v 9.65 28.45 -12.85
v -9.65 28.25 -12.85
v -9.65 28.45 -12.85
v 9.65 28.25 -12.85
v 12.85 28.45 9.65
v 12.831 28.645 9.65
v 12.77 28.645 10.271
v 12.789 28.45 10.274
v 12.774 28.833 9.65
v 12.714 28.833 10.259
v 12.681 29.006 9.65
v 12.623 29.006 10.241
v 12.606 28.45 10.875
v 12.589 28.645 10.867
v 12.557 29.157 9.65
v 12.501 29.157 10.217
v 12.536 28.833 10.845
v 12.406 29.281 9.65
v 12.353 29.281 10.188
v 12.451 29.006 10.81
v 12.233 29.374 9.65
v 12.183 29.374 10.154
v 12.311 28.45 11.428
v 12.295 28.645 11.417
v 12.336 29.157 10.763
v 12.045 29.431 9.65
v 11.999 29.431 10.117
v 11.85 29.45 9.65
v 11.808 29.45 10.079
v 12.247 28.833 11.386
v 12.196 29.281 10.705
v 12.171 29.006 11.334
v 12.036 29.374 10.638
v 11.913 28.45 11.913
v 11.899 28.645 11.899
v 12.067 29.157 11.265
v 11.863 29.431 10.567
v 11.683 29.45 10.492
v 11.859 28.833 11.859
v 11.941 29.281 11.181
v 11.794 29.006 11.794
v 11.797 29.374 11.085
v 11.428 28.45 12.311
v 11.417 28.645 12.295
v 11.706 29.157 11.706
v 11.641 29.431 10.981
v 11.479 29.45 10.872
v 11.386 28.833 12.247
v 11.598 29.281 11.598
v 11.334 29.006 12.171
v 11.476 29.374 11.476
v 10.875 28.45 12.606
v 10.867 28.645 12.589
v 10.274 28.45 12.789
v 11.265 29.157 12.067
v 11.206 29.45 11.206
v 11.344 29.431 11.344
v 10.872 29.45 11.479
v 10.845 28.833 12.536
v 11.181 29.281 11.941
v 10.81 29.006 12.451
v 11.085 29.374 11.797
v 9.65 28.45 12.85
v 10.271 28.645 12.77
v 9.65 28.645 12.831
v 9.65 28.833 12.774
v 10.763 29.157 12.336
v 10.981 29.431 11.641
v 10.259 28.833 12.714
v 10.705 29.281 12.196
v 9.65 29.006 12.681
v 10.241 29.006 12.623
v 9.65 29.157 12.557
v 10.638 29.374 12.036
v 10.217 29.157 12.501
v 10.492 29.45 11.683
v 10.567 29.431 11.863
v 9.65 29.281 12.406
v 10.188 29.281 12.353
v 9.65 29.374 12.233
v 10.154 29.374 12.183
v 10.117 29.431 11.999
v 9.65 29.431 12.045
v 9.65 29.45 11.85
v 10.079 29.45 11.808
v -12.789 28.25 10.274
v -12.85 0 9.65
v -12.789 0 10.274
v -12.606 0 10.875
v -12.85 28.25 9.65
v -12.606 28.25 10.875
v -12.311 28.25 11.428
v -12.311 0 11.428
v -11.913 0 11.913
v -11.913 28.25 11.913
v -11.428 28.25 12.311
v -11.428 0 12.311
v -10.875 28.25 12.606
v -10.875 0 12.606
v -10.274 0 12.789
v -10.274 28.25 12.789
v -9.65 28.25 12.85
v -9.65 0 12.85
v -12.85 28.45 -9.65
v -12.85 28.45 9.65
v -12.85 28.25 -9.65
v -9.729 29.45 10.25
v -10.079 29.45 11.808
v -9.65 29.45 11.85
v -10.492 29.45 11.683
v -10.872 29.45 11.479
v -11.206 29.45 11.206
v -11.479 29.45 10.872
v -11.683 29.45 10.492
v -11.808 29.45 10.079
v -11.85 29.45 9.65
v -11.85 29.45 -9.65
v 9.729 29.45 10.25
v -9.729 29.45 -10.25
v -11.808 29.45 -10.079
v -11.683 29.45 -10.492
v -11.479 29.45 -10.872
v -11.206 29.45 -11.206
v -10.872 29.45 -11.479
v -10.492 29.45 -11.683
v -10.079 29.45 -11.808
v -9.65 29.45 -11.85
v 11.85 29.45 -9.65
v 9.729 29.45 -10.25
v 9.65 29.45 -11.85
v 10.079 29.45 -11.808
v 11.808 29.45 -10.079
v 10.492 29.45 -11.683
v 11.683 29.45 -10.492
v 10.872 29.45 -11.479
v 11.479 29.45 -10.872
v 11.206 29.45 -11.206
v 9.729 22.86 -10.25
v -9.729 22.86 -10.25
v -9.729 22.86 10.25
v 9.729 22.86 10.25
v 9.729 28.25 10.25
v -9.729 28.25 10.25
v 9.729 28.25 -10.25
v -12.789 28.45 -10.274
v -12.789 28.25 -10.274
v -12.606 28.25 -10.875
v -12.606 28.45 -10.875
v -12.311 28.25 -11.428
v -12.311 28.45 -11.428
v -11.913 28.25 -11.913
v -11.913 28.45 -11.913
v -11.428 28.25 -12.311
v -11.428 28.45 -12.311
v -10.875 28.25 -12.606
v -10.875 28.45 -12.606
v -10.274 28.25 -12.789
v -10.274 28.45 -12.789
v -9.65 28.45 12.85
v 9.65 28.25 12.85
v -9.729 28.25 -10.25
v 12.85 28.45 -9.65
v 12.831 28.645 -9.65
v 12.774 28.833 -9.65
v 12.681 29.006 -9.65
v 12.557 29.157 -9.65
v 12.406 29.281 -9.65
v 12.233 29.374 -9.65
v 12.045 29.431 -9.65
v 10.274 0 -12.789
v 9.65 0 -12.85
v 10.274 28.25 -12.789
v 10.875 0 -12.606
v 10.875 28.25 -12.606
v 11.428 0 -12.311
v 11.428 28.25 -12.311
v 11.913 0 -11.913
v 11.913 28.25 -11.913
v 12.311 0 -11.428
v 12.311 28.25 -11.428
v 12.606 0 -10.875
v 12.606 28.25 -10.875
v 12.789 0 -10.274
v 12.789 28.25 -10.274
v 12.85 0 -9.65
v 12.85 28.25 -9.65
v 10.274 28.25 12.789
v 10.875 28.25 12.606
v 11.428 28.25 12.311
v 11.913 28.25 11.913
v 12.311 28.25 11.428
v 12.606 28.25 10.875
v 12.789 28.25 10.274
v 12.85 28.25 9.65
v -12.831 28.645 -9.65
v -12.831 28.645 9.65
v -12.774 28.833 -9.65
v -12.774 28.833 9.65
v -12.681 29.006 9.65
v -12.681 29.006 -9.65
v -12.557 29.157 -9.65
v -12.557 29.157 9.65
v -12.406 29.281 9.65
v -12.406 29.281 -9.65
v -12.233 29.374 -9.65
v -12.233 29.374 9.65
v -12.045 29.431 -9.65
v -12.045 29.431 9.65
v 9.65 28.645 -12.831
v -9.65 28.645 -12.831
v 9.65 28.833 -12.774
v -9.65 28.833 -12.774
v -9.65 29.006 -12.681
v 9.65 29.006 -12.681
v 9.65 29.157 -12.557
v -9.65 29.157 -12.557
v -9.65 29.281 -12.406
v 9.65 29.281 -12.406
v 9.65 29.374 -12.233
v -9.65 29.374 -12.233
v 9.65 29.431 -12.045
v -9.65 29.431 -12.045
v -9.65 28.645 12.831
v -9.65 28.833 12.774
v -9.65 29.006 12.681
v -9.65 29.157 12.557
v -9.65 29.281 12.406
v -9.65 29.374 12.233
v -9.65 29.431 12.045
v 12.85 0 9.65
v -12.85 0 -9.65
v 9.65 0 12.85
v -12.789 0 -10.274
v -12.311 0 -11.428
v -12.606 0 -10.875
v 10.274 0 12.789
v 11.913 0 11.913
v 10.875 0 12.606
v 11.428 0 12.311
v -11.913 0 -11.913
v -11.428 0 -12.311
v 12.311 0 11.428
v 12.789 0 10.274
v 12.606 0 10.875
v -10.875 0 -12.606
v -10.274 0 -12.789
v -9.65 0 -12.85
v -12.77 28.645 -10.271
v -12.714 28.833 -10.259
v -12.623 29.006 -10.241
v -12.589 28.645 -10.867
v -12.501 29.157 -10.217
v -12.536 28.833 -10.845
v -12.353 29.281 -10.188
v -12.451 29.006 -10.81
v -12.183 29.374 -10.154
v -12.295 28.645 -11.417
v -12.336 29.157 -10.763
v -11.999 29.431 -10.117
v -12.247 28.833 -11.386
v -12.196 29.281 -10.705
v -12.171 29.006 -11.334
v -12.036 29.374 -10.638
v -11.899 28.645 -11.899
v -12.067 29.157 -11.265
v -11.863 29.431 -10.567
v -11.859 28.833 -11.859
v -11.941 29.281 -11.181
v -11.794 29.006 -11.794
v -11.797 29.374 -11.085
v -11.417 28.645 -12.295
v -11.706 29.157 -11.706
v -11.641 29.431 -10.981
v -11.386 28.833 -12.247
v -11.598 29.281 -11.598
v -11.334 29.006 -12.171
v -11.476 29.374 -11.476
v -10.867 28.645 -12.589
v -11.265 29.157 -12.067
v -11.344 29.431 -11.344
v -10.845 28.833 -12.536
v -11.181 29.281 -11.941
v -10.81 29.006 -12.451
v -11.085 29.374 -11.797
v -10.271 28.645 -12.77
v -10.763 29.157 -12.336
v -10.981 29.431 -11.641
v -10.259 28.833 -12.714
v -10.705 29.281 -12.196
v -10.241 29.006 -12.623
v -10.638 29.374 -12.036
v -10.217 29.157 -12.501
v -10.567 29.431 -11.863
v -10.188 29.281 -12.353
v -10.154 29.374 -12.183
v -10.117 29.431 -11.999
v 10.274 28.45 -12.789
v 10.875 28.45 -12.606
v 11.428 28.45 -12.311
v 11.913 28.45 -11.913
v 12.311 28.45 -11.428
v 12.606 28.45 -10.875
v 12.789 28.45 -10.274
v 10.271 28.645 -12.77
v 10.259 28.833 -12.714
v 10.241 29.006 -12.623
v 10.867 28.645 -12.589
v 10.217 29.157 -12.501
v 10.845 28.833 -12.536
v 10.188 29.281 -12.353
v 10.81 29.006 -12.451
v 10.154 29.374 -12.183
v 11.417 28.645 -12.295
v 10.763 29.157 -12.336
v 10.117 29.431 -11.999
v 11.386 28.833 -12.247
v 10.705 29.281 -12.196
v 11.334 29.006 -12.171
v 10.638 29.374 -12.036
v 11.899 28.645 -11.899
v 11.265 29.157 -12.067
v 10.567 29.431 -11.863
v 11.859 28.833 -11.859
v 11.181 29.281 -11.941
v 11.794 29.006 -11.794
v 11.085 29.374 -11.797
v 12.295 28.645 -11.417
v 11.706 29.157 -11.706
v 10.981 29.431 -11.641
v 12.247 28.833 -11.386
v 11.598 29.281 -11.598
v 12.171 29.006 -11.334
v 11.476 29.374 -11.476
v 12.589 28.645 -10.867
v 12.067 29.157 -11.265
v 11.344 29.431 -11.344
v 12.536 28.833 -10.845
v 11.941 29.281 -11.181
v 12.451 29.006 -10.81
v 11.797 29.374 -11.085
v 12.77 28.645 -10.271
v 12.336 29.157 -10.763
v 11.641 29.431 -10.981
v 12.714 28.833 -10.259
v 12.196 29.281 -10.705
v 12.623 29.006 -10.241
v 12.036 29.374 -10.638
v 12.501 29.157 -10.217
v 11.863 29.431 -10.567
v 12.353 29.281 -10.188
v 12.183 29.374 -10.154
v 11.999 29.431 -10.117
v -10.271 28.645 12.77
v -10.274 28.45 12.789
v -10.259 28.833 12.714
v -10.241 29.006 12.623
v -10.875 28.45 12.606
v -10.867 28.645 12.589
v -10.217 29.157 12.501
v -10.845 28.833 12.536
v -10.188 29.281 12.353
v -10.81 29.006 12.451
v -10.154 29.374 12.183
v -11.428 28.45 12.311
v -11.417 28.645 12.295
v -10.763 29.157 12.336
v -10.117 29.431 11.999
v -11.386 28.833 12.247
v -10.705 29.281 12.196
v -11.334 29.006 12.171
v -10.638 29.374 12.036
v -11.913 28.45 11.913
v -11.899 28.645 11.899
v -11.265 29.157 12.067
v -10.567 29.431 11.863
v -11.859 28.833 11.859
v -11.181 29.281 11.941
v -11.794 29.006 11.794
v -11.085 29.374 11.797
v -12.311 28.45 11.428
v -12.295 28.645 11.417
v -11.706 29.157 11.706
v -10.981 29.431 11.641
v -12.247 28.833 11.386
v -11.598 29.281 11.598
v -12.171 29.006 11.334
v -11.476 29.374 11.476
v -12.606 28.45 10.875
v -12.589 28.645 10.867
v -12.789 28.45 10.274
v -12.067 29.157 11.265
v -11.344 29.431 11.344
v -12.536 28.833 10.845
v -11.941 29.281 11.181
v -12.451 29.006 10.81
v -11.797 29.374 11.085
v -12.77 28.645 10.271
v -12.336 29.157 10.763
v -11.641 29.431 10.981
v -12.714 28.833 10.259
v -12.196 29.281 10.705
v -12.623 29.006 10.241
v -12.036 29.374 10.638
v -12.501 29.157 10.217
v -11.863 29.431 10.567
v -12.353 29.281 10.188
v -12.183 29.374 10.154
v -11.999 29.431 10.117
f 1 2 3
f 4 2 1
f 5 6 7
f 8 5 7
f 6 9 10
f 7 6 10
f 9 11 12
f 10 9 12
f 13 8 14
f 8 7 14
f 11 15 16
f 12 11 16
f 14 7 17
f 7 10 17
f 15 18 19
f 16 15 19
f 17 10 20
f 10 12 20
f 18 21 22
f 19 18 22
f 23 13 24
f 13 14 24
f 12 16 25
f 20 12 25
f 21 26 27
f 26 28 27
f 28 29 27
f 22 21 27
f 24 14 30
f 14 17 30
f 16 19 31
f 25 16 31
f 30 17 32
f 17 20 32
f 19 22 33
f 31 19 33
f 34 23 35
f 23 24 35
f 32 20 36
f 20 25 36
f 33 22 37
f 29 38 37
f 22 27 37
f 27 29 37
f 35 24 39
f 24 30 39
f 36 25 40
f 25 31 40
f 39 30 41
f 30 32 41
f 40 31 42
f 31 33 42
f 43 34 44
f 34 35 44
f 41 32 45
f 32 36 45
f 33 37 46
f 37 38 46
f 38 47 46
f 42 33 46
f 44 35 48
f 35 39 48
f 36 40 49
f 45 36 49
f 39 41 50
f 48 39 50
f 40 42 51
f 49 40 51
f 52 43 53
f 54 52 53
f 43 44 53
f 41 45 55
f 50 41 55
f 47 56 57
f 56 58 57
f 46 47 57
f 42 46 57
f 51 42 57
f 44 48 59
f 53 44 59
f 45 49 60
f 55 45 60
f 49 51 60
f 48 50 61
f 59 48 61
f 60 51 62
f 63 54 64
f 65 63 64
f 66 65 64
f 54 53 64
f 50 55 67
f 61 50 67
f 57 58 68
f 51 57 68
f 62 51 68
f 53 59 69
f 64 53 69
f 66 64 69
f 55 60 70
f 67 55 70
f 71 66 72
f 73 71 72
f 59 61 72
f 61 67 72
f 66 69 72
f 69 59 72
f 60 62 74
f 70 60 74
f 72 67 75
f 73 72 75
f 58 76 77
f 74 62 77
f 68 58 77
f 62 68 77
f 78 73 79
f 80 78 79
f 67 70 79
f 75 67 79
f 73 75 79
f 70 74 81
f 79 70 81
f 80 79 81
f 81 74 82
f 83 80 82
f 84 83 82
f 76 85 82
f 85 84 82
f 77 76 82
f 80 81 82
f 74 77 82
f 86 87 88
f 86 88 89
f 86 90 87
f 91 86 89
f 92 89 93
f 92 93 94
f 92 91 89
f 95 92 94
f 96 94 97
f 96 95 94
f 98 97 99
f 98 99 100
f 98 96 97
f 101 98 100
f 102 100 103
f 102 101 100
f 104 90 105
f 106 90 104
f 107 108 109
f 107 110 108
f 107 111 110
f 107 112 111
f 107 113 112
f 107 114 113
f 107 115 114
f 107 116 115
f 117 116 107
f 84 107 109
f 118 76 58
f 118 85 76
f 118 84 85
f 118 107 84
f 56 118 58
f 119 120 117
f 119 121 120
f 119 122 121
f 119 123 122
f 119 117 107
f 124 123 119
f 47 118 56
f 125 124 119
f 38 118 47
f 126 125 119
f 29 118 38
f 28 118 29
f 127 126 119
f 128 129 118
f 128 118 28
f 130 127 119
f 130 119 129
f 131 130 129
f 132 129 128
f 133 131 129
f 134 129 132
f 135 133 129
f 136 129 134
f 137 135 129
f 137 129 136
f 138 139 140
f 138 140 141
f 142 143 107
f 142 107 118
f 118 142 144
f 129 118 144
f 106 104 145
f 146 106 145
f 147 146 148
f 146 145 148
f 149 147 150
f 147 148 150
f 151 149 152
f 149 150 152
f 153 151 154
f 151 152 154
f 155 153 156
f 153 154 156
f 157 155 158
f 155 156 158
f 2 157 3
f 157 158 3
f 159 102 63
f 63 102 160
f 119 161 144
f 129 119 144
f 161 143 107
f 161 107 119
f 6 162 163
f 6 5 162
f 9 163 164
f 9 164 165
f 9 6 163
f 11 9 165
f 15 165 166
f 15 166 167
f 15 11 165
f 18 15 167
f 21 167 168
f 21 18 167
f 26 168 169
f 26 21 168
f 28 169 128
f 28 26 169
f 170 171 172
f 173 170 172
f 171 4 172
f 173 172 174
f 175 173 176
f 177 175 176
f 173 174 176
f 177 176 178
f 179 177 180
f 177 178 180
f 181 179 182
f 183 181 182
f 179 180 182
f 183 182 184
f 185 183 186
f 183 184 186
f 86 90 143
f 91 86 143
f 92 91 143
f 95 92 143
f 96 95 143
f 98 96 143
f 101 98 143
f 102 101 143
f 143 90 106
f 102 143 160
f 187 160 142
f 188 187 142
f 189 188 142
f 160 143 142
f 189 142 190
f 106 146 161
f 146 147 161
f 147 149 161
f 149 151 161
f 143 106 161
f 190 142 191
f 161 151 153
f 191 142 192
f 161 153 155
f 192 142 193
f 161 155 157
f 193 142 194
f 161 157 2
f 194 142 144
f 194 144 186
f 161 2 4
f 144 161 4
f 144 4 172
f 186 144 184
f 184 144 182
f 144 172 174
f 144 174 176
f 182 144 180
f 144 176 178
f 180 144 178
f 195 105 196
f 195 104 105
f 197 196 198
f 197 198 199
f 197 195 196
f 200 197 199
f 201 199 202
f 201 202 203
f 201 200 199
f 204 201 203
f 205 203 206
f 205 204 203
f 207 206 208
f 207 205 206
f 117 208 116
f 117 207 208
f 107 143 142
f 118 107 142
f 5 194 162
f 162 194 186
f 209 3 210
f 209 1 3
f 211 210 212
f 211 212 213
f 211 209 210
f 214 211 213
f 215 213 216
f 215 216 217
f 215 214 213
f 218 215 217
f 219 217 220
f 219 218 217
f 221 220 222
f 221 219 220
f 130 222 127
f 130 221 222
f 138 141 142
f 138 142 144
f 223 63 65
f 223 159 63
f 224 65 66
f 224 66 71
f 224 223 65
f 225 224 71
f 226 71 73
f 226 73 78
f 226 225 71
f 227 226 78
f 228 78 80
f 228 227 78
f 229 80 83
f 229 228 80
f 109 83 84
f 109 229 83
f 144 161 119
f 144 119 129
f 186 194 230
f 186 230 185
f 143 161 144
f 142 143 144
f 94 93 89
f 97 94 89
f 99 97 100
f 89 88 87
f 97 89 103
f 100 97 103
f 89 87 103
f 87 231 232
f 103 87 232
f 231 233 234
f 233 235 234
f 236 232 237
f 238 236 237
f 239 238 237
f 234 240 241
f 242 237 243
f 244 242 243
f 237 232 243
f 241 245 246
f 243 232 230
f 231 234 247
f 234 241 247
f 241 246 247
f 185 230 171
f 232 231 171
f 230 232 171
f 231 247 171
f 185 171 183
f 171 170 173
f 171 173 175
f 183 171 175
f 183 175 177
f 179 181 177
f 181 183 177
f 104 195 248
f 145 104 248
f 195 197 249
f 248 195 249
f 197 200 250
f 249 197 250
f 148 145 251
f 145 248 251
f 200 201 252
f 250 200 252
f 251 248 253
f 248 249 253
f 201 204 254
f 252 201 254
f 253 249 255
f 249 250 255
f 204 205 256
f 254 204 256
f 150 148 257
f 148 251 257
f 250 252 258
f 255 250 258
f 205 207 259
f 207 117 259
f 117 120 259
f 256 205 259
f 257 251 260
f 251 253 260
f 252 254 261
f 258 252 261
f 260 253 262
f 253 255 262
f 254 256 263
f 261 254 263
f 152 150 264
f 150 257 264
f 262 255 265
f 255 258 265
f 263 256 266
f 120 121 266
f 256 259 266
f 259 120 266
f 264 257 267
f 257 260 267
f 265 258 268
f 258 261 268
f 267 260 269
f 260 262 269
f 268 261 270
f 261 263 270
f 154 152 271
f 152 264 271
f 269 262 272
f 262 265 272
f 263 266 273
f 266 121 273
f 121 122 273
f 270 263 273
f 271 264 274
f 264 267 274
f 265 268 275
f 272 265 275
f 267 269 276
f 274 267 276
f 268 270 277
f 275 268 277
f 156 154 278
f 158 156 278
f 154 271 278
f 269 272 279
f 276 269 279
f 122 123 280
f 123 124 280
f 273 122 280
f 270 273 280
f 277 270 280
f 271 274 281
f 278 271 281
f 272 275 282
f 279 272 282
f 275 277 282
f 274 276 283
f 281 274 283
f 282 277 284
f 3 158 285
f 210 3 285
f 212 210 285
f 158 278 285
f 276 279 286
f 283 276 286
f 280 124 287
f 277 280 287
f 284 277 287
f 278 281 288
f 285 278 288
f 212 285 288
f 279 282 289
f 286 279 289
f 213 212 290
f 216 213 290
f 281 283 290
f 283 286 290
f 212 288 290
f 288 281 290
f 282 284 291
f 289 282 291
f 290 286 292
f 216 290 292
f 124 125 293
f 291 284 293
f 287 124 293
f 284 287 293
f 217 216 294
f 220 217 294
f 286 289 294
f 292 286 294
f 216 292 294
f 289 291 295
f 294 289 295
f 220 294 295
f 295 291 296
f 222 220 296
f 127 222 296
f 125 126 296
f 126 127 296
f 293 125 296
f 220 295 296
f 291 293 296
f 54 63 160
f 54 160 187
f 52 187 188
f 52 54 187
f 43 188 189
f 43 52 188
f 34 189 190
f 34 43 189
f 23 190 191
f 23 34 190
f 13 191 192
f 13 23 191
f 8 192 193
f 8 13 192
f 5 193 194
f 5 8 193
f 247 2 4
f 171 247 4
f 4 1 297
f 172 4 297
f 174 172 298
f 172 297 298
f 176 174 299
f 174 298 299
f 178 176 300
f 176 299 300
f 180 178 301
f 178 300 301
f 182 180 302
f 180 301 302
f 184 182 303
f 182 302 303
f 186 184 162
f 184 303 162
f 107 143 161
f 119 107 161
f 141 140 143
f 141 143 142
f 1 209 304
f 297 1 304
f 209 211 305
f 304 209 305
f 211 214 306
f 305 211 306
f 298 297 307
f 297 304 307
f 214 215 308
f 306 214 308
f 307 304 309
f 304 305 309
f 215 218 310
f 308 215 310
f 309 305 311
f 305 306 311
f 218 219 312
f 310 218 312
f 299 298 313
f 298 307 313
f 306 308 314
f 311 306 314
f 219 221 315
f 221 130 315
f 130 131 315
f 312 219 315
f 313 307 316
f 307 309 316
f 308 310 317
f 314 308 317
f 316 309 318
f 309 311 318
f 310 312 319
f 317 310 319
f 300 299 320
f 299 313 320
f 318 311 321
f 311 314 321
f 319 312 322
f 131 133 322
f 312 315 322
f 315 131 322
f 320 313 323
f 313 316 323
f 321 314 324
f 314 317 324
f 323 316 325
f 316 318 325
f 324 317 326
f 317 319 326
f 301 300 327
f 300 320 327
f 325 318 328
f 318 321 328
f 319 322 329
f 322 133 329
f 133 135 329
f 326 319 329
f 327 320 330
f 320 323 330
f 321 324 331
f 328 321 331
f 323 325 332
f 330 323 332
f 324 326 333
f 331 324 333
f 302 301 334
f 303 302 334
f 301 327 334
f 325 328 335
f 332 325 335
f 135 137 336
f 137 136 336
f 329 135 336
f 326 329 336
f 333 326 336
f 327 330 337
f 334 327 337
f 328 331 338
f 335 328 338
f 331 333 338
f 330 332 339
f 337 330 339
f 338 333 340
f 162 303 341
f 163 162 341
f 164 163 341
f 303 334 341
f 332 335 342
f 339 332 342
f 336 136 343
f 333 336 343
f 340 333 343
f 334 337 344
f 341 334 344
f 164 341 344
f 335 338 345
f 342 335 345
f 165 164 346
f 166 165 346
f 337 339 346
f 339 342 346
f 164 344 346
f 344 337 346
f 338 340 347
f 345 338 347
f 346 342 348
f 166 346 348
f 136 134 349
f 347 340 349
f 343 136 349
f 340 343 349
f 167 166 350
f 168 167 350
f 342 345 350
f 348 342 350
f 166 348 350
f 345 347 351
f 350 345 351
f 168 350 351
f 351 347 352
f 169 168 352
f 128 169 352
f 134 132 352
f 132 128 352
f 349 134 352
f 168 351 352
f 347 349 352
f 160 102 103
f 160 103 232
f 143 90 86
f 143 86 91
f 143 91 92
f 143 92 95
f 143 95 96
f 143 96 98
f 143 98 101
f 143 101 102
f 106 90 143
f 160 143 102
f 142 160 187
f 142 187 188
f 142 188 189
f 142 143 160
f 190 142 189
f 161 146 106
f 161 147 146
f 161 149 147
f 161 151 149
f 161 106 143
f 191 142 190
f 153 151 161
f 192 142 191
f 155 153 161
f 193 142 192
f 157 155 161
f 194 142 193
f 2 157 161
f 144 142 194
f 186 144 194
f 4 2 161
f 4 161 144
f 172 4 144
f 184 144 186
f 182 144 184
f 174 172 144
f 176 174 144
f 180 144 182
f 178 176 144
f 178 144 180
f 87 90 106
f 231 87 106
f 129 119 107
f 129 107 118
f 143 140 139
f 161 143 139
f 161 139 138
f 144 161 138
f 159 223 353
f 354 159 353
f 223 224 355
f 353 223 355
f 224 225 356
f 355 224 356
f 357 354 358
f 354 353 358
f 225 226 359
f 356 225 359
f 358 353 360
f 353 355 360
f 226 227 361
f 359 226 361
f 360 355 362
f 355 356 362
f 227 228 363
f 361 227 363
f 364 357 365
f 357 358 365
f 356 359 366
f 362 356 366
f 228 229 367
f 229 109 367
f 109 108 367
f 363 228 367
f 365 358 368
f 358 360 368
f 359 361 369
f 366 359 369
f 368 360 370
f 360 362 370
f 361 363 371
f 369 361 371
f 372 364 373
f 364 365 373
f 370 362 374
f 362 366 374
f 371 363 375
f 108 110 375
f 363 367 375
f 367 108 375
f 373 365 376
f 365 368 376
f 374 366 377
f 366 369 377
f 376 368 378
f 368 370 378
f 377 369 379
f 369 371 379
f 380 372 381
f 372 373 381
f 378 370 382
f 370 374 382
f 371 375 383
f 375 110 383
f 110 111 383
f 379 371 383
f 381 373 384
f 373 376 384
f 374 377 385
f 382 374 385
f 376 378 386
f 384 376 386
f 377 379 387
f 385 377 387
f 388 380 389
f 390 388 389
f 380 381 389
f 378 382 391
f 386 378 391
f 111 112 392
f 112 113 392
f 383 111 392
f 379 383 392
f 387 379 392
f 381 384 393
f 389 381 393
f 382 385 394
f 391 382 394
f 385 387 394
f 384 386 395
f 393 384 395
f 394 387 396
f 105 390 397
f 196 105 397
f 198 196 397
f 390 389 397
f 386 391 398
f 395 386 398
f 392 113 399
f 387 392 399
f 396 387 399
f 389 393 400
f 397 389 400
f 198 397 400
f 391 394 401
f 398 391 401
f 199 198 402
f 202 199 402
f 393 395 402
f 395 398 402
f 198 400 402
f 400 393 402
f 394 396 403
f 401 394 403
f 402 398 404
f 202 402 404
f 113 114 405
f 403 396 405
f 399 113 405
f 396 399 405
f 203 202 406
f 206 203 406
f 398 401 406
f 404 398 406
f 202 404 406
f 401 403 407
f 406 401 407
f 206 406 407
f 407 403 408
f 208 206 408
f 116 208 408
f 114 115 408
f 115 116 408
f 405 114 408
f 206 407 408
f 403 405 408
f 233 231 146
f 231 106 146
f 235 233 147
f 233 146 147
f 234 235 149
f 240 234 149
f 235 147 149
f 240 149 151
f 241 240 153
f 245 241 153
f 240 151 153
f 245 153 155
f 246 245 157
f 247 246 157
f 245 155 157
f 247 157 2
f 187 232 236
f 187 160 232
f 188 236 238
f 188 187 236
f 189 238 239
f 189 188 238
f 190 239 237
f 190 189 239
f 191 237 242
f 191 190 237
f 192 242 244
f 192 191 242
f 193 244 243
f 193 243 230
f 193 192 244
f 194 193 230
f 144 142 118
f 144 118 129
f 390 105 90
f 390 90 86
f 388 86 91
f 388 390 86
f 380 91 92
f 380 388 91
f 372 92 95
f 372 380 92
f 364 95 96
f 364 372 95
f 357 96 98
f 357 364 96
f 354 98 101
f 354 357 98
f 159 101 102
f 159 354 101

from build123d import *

# Parameters (mm, degrees)
SKETCH1_W           = 25.7
SKETCH1_H           = 25.7
SKETCH1_W_2         = 19.457250824
SKETCH1_H_2         = 20.5
BOSS_EXTRUDE1_DEPTH = 28.25
SKETCH1_5_W         = 19.457250824
SKETCH1_5_H         = 20.5
BOSS_EXTRUDE4_DEPTH = 22.86
BOSS_EXTRUDE2_START = 28.25
SKETCH1_3_W         = 19.457250824
SKETCH1_3_H         = 20.5
BOSS_EXTRUDE2_DEPTH = 1.2
BOSS_EXTRUDE3_START = 28.25
SKETCH1_4_W         = 25.7
SKETCH1_4_H         = 25.7
SKETCH1_4_W_2       = 19.457250824
SKETCH1_4_H_2       = 20.5
BOSS_EXTRUDE3_DEPTH = 1.2
FILLET1_R           = 3.19999995
FILLET2_R           = 3.19999995
FILLET3_R           = 1


with BuildPart() as part:
    # Sketch1 → Boss-Extrude1 (new body)
    with BuildSketch(Plane(origin=(0, 0, 0), x_dir=(1, 0, 0), z_dir=(0, 1, 0))):
        Rectangle(SKETCH1_W, SKETCH1_H)
        Rectangle(SKETCH1_W_2, SKETCH1_H_2, mode=Mode.SUBTRACT)
    extrude(amount=BOSS_EXTRUDE1_DEPTH)

    # Sketch1<5> → Boss-Extrude4 (add)
    with BuildSketch(Plane(origin=(0, 0, 0), x_dir=(1, 0, 0), z_dir=(0, 1, 0))):
        Rectangle(SKETCH1_5_W, SKETCH1_5_H)
    extrude(amount=BOSS_EXTRUDE4_DEPTH)

    # Fillet1
    fillet1_edges = [part.edges().sort_by_distance(p)[0] for p in [
        (-12.85, 14.125, 12.85),
        (-12.85, 14.125, -12.85),
        (12.85, 14.125, -12.85),
        (12.85, 14.125, 12.85),
    ]]
    fillet(fillet1_edges, radius=FILLET1_R)


with BuildPart() as body_2:
    # Sketch1<3> → Boss-Extrude2 (new body)
    with BuildSketch(Plane(origin=(0, 0, 0), x_dir=(1, 0, 0), z_dir=(0, 1, 0)).offset(BOSS_EXTRUDE2_START)):
        Rectangle(SKETCH1_3_W, SKETCH1_3_H)
    extrude(amount=BOSS_EXTRUDE2_DEPTH)


with BuildPart() as body_3:
    # Sketch1<4> → Boss-Extrude3 (new body)
    with BuildSketch(Plane(origin=(0, 0, 0), x_dir=(1, 0, 0), z_dir=(0, 1, 0)).offset(BOSS_EXTRUDE3_START)):
        Rectangle(SKETCH1_4_W, SKETCH1_4_H)
        Rectangle(SKETCH1_4_W_2, SKETCH1_4_H_2, mode=Mode.SUBTRACT)
    extrude(amount=BOSS_EXTRUDE3_DEPTH)

    # Fillet2
    fillet2_edges = [body_3.edges().sort_by_distance(p)[0] for p in [
        (-12.85, 28.85, 12.85),
        (12.85, 28.85, 12.85),
        (12.85, 28.85, -12.85),
        (-12.85, 28.85, -12.85),
    ]]
    fillet(fillet2_edges, radius=FILLET2_R)

    # Fillet3
    fillet3_edges = [body_3.edges().sort_by_distance(p)[0] for p in [
        (-12.85, 29.45, 0),
        (0, 29.45, -12.85),
        (0, 29.45, 12.85),
        (12.85, 29.45, 0),
        (-11.912741714, 29.45, 11.912741714),
        (11.912741714, 29.45, 11.912741714),
        (11.912741714, 29.45, -11.912741714),
        (-11.912741714, 29.45, -11.912741714),
    ]]
    fillet(fillet3_edges, radius=FILLET3_R)


solid = Compound([part.part, body_2.part, body_3.part])
